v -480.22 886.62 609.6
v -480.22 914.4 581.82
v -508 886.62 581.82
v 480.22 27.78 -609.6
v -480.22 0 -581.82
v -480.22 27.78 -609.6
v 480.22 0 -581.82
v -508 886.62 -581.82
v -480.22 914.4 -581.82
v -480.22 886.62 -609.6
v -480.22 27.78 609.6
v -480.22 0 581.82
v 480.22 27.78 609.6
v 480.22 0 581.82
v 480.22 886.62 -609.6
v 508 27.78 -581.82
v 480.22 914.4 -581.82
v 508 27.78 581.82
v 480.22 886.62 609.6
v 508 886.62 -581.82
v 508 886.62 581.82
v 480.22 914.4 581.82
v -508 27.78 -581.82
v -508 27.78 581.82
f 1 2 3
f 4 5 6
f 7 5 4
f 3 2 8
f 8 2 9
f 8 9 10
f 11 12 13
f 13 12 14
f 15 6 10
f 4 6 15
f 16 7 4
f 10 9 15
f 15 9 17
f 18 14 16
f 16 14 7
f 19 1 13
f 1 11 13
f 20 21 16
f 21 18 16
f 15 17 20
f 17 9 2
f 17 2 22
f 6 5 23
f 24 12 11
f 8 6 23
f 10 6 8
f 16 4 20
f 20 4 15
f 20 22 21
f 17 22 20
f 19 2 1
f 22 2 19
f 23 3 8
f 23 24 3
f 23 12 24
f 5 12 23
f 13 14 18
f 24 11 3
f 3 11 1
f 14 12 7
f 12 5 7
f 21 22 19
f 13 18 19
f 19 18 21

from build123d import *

# Parameters (mm, degrees)
SKETCH2_W           = 1016
SKETCH2_H           = 1219.2
BOSS_EXTRUDE1_DEPTH = 914.4
CHAMFER1_SIZE       = 27.78


with BuildPart() as part:
    # Sketch2 → Boss-Extrude1 (new body)
    with BuildSketch(Plane(origin=(0, 0, 0), x_dir=(1, 0, 0), z_dir=(0, 1, 0))):
        Rectangle(SKETCH2_W, SKETCH2_H)
    extrude(amount=BOSS_EXTRUDE1_DEPTH)

    # Chamfer1
    chamfer1_edges = [part.edges().sort_by_distance(p)[0] for p in [
        (-508, 914.4, 0),
        (0, 914.4, 609.6),
        (508, 914.4, 0),
        (0, 0, 609.6),
        (-508, 0, 0),
        (0, 0, -609.6),
        (508, 0, 0),
        (0, 914.4, -609.6),
        (508, 457.2, 609.6),
        (-508, 457.2, 609.6),
        (-508, 457.2, -609.6),
        (508, 457.2, -609.6),
    ]]
    chamfer(chamfer1_edges, length=CHAMFER1_SIZE)


solid = part.part
